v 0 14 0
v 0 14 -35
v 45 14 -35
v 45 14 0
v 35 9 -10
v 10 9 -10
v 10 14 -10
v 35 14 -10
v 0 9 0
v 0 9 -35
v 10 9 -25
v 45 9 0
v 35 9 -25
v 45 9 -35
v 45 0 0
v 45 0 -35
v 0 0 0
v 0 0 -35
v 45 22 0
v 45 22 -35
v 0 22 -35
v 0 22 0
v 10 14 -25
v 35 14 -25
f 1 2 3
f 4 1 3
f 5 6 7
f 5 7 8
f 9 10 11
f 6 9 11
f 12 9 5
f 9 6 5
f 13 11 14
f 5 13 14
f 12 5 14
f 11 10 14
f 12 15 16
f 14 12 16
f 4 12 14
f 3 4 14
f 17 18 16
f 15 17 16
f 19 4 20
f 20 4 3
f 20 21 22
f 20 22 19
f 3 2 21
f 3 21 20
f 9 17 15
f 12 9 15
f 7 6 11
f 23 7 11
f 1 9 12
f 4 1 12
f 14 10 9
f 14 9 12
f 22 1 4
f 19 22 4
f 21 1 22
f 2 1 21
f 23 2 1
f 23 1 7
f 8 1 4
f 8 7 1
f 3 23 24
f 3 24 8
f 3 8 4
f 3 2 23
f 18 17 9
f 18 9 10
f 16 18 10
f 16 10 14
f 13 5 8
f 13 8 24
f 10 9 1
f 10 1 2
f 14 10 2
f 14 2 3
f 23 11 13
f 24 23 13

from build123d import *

# Parameters (mm, degrees)
SKETCH2_W           = 45
SKETCH2_H           = 35
BOSS_EXTRUDE1_DEPTH = 9
SKETCH5_W           = 45
SKETCH5_H           = 35
SKETCH5_W_2         = 25
SKETCH5_H_2         = 15
BOSS_EXTRUDE4_DEPTH = 5
SKETCH6_W           = 45
SKETCH6_H           = 35
BOSS_EXTRUDE5_DEPTH = 8


with BuildPart() as part:
    # Sketch2 → Boss-Extrude1 (new body)
    with BuildSketch(Plane(origin=(0, 0, 0), x_dir=(1, 0, 0), z_dir=(0, 1, 0))):
        with Locations((22.5, 17.5)):
            Rectangle(SKETCH2_W, SKETCH2_H)
    extrude(amount=BOSS_EXTRUDE1_DEPTH)


with BuildPart() as body_2:
    # Sketch5 → Boss-Extrude4 (new body)
    with BuildSketch(Plane(origin=(0, 9, 0), x_dir=(1, 0, 0), z_dir=(0, 1, 0))):
        with Locations((22.5, 17.5)):
            Rectangle(SKETCH5_W, SKETCH5_H)
        with Locations((22.5, 17.5)):
            Rectangle(SKETCH5_W_2, SKETCH5_H_2, mode=Mode.SUBTRACT)
    extrude(amount=BOSS_EXTRUDE4_DEPTH)


with BuildPart() as body_3:
    # Sketch6 → Boss-Extrude5 (new body)
    with BuildSketch(Plane(origin=(0, 14, 0), x_dir=(1, 0, 0), z_dir=(0, 1, 0))):
        with Locations((22.5, 17.5)):
            Rectangle(SKETCH6_W, SKETCH6_H)
    extrude(amount=BOSS_EXTRUDE5_DEPTH)


solid = Compound([part.part, body_2.part, body_3.part])
